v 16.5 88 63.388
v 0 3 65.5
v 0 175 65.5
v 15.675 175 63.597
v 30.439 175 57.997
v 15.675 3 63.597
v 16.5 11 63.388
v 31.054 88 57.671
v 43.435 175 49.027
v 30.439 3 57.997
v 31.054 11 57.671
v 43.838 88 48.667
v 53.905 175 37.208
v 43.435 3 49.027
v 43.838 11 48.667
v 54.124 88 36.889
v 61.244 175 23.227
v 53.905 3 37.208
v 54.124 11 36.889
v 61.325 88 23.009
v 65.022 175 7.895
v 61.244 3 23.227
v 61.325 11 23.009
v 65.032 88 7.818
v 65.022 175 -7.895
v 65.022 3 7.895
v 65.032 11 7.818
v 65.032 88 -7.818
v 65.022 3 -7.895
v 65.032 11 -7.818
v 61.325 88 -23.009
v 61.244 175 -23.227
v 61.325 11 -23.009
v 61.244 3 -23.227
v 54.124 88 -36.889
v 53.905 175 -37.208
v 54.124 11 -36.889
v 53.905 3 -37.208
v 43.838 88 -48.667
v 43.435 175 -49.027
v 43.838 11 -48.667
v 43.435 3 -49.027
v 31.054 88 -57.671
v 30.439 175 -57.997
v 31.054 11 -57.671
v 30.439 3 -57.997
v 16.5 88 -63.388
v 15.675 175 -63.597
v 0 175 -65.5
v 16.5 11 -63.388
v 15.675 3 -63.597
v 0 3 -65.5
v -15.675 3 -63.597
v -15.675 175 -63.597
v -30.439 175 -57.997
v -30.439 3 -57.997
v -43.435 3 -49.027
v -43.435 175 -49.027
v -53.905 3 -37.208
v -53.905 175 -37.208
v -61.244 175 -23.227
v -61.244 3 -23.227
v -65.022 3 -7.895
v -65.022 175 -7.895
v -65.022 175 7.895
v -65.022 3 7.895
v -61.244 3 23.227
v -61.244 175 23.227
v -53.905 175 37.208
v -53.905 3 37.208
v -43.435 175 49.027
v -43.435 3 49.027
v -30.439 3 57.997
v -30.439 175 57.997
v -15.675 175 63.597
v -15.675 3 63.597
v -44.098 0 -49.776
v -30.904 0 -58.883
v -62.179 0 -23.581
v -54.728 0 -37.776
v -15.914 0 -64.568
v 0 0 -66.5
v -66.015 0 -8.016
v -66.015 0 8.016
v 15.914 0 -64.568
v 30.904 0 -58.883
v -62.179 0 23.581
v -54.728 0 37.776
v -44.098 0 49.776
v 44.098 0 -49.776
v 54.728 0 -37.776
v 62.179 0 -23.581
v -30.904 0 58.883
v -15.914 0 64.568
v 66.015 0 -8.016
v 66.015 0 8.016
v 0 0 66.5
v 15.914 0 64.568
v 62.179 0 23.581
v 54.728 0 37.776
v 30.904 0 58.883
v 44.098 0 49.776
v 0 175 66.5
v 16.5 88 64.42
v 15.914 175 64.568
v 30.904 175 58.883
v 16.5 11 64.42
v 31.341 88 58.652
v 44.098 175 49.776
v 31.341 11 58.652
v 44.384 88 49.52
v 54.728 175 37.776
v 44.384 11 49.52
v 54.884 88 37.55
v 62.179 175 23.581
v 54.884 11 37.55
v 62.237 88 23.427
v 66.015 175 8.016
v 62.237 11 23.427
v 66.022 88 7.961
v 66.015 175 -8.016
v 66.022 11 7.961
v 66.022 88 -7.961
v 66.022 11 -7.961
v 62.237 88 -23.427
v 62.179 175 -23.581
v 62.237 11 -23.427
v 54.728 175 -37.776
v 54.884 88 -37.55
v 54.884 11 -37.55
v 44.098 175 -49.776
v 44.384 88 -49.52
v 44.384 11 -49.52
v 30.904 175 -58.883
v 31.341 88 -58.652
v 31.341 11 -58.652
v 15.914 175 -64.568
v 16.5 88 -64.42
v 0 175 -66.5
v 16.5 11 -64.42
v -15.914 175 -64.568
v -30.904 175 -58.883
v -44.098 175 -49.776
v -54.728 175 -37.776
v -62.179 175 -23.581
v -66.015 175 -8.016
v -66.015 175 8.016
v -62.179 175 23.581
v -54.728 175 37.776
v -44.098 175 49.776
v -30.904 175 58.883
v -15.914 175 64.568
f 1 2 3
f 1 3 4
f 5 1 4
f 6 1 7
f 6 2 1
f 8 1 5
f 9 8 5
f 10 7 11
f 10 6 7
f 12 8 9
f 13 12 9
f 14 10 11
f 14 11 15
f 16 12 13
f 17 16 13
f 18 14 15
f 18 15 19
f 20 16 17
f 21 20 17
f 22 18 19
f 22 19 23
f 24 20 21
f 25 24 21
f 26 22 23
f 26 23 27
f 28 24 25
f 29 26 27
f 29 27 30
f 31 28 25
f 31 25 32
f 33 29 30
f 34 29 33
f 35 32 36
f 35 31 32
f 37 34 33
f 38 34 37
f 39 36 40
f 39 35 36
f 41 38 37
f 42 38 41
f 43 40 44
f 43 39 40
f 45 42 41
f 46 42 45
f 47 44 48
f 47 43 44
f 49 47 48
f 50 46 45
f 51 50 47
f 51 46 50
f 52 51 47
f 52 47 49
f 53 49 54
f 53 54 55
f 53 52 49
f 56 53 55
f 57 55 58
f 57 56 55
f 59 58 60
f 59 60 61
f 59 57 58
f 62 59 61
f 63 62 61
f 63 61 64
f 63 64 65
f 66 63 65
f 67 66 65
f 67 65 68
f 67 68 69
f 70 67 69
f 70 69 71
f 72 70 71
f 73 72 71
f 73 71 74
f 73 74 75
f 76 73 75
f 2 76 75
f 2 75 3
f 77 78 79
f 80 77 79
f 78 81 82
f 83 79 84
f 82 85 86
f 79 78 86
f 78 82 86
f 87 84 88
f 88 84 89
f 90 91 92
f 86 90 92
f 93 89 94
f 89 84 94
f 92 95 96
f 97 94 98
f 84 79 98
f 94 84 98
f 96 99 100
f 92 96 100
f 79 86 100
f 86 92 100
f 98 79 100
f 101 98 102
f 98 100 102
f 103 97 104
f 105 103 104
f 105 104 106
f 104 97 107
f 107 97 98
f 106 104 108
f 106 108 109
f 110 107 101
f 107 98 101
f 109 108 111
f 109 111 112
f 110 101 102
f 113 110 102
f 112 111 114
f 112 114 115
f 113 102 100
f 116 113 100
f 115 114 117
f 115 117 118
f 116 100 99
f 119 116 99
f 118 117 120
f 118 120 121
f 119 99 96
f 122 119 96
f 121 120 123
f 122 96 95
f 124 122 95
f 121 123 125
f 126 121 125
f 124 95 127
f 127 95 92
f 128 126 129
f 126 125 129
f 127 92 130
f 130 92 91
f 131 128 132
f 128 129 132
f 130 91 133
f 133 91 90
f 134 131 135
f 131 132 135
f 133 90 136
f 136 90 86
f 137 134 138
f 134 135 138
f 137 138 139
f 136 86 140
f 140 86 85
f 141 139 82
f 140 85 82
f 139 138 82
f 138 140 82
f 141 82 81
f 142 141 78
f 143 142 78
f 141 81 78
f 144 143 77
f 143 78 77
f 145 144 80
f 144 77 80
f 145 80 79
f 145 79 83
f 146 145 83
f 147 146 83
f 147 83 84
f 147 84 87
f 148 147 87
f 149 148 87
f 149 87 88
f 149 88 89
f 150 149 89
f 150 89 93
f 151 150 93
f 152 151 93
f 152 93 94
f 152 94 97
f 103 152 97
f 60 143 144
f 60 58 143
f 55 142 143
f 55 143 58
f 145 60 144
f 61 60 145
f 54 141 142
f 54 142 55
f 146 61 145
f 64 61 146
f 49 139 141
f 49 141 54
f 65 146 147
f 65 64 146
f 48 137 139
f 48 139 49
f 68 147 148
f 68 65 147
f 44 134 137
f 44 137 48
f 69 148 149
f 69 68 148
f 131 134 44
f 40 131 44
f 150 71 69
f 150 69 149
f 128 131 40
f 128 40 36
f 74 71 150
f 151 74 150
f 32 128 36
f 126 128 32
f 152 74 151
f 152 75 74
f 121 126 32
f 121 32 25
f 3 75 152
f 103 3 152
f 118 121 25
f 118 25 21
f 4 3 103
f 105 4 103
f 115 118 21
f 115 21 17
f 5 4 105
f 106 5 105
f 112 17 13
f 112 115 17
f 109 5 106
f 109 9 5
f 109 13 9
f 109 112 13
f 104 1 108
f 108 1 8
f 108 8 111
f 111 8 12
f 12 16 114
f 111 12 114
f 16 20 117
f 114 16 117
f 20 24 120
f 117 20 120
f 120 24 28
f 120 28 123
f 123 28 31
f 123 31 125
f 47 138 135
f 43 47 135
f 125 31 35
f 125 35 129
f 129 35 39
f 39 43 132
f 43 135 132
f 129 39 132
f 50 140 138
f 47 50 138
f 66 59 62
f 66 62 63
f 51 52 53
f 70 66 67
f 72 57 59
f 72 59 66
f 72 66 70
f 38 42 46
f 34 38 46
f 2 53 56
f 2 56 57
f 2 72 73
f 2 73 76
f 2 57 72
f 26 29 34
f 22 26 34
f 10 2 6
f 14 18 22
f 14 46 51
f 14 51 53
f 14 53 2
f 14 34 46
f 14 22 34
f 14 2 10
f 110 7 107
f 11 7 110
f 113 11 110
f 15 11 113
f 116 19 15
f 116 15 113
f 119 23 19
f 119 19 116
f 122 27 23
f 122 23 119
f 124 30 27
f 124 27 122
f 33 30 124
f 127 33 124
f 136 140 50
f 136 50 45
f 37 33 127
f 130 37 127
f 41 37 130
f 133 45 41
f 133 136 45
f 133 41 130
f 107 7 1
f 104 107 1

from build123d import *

# Parameters (mm, degrees)
SKETCH_2_R               = 66.5
SKETCH_2_R_2             = 65.5
EXTRUDE_1_DEPTH          = 175
SKETCH_3_R               = 65.5
EXTRUDE_2_DEPTH          = 3
CUT_EXTRUDE_1_DEPTH      = 199.669323248
CUT_EXTRUDE_1_DEPTH_BACK = 199.669323248
SKETCH_4_W               = 50
SKETCH_4_H               = 77


with BuildPart() as part:
    # 스케치2 → 보스-돌출1 (new body)
    with BuildSketch(Plane(origin=(0, 0, 0), x_dir=(1, 0, 0), z_dir=(0, 1, 0))):
        with Locations(Location((0, 0, 0), (0, 0, 270))):
            Circle(SKETCH_2_R)
        with Locations(Location((0, 0, 0), (0, 0, 270))):
            Circle(SKETCH_2_R_2, mode=Mode.SUBTRACT)
    extrude(amount=EXTRUDE_1_DEPTH)

    # 스케치3 → 보스-돌출2 (add)
    with BuildSketch(Plane(origin=(0, 0, 0), x_dir=(1, 0, 0), z_dir=(0, 1, 0))):
        with Locations(Location((0, 0, 0), (0, 0, 270))):
            Circle(SKETCH_3_R)
    extrude(amount=EXTRUDE_2_DEPTH)

    # 스케치4 → 컷-돌출1 (cut, two sides: drawn at the far end of the back side and taken through both)
    with BuildSketch(Plane.XY.offset(-CUT_EXTRUDE_1_DEPTH_BACK)):
        with Locations((41.5, 49.5)):
            Rectangle(SKETCH_4_W, SKETCH_4_H)
    extrude(amount=CUT_EXTRUDE_1_DEPTH + CUT_EXTRUDE_1_DEPTH_BACK, mode=Mode.SUBTRACT)


solid = part.part
